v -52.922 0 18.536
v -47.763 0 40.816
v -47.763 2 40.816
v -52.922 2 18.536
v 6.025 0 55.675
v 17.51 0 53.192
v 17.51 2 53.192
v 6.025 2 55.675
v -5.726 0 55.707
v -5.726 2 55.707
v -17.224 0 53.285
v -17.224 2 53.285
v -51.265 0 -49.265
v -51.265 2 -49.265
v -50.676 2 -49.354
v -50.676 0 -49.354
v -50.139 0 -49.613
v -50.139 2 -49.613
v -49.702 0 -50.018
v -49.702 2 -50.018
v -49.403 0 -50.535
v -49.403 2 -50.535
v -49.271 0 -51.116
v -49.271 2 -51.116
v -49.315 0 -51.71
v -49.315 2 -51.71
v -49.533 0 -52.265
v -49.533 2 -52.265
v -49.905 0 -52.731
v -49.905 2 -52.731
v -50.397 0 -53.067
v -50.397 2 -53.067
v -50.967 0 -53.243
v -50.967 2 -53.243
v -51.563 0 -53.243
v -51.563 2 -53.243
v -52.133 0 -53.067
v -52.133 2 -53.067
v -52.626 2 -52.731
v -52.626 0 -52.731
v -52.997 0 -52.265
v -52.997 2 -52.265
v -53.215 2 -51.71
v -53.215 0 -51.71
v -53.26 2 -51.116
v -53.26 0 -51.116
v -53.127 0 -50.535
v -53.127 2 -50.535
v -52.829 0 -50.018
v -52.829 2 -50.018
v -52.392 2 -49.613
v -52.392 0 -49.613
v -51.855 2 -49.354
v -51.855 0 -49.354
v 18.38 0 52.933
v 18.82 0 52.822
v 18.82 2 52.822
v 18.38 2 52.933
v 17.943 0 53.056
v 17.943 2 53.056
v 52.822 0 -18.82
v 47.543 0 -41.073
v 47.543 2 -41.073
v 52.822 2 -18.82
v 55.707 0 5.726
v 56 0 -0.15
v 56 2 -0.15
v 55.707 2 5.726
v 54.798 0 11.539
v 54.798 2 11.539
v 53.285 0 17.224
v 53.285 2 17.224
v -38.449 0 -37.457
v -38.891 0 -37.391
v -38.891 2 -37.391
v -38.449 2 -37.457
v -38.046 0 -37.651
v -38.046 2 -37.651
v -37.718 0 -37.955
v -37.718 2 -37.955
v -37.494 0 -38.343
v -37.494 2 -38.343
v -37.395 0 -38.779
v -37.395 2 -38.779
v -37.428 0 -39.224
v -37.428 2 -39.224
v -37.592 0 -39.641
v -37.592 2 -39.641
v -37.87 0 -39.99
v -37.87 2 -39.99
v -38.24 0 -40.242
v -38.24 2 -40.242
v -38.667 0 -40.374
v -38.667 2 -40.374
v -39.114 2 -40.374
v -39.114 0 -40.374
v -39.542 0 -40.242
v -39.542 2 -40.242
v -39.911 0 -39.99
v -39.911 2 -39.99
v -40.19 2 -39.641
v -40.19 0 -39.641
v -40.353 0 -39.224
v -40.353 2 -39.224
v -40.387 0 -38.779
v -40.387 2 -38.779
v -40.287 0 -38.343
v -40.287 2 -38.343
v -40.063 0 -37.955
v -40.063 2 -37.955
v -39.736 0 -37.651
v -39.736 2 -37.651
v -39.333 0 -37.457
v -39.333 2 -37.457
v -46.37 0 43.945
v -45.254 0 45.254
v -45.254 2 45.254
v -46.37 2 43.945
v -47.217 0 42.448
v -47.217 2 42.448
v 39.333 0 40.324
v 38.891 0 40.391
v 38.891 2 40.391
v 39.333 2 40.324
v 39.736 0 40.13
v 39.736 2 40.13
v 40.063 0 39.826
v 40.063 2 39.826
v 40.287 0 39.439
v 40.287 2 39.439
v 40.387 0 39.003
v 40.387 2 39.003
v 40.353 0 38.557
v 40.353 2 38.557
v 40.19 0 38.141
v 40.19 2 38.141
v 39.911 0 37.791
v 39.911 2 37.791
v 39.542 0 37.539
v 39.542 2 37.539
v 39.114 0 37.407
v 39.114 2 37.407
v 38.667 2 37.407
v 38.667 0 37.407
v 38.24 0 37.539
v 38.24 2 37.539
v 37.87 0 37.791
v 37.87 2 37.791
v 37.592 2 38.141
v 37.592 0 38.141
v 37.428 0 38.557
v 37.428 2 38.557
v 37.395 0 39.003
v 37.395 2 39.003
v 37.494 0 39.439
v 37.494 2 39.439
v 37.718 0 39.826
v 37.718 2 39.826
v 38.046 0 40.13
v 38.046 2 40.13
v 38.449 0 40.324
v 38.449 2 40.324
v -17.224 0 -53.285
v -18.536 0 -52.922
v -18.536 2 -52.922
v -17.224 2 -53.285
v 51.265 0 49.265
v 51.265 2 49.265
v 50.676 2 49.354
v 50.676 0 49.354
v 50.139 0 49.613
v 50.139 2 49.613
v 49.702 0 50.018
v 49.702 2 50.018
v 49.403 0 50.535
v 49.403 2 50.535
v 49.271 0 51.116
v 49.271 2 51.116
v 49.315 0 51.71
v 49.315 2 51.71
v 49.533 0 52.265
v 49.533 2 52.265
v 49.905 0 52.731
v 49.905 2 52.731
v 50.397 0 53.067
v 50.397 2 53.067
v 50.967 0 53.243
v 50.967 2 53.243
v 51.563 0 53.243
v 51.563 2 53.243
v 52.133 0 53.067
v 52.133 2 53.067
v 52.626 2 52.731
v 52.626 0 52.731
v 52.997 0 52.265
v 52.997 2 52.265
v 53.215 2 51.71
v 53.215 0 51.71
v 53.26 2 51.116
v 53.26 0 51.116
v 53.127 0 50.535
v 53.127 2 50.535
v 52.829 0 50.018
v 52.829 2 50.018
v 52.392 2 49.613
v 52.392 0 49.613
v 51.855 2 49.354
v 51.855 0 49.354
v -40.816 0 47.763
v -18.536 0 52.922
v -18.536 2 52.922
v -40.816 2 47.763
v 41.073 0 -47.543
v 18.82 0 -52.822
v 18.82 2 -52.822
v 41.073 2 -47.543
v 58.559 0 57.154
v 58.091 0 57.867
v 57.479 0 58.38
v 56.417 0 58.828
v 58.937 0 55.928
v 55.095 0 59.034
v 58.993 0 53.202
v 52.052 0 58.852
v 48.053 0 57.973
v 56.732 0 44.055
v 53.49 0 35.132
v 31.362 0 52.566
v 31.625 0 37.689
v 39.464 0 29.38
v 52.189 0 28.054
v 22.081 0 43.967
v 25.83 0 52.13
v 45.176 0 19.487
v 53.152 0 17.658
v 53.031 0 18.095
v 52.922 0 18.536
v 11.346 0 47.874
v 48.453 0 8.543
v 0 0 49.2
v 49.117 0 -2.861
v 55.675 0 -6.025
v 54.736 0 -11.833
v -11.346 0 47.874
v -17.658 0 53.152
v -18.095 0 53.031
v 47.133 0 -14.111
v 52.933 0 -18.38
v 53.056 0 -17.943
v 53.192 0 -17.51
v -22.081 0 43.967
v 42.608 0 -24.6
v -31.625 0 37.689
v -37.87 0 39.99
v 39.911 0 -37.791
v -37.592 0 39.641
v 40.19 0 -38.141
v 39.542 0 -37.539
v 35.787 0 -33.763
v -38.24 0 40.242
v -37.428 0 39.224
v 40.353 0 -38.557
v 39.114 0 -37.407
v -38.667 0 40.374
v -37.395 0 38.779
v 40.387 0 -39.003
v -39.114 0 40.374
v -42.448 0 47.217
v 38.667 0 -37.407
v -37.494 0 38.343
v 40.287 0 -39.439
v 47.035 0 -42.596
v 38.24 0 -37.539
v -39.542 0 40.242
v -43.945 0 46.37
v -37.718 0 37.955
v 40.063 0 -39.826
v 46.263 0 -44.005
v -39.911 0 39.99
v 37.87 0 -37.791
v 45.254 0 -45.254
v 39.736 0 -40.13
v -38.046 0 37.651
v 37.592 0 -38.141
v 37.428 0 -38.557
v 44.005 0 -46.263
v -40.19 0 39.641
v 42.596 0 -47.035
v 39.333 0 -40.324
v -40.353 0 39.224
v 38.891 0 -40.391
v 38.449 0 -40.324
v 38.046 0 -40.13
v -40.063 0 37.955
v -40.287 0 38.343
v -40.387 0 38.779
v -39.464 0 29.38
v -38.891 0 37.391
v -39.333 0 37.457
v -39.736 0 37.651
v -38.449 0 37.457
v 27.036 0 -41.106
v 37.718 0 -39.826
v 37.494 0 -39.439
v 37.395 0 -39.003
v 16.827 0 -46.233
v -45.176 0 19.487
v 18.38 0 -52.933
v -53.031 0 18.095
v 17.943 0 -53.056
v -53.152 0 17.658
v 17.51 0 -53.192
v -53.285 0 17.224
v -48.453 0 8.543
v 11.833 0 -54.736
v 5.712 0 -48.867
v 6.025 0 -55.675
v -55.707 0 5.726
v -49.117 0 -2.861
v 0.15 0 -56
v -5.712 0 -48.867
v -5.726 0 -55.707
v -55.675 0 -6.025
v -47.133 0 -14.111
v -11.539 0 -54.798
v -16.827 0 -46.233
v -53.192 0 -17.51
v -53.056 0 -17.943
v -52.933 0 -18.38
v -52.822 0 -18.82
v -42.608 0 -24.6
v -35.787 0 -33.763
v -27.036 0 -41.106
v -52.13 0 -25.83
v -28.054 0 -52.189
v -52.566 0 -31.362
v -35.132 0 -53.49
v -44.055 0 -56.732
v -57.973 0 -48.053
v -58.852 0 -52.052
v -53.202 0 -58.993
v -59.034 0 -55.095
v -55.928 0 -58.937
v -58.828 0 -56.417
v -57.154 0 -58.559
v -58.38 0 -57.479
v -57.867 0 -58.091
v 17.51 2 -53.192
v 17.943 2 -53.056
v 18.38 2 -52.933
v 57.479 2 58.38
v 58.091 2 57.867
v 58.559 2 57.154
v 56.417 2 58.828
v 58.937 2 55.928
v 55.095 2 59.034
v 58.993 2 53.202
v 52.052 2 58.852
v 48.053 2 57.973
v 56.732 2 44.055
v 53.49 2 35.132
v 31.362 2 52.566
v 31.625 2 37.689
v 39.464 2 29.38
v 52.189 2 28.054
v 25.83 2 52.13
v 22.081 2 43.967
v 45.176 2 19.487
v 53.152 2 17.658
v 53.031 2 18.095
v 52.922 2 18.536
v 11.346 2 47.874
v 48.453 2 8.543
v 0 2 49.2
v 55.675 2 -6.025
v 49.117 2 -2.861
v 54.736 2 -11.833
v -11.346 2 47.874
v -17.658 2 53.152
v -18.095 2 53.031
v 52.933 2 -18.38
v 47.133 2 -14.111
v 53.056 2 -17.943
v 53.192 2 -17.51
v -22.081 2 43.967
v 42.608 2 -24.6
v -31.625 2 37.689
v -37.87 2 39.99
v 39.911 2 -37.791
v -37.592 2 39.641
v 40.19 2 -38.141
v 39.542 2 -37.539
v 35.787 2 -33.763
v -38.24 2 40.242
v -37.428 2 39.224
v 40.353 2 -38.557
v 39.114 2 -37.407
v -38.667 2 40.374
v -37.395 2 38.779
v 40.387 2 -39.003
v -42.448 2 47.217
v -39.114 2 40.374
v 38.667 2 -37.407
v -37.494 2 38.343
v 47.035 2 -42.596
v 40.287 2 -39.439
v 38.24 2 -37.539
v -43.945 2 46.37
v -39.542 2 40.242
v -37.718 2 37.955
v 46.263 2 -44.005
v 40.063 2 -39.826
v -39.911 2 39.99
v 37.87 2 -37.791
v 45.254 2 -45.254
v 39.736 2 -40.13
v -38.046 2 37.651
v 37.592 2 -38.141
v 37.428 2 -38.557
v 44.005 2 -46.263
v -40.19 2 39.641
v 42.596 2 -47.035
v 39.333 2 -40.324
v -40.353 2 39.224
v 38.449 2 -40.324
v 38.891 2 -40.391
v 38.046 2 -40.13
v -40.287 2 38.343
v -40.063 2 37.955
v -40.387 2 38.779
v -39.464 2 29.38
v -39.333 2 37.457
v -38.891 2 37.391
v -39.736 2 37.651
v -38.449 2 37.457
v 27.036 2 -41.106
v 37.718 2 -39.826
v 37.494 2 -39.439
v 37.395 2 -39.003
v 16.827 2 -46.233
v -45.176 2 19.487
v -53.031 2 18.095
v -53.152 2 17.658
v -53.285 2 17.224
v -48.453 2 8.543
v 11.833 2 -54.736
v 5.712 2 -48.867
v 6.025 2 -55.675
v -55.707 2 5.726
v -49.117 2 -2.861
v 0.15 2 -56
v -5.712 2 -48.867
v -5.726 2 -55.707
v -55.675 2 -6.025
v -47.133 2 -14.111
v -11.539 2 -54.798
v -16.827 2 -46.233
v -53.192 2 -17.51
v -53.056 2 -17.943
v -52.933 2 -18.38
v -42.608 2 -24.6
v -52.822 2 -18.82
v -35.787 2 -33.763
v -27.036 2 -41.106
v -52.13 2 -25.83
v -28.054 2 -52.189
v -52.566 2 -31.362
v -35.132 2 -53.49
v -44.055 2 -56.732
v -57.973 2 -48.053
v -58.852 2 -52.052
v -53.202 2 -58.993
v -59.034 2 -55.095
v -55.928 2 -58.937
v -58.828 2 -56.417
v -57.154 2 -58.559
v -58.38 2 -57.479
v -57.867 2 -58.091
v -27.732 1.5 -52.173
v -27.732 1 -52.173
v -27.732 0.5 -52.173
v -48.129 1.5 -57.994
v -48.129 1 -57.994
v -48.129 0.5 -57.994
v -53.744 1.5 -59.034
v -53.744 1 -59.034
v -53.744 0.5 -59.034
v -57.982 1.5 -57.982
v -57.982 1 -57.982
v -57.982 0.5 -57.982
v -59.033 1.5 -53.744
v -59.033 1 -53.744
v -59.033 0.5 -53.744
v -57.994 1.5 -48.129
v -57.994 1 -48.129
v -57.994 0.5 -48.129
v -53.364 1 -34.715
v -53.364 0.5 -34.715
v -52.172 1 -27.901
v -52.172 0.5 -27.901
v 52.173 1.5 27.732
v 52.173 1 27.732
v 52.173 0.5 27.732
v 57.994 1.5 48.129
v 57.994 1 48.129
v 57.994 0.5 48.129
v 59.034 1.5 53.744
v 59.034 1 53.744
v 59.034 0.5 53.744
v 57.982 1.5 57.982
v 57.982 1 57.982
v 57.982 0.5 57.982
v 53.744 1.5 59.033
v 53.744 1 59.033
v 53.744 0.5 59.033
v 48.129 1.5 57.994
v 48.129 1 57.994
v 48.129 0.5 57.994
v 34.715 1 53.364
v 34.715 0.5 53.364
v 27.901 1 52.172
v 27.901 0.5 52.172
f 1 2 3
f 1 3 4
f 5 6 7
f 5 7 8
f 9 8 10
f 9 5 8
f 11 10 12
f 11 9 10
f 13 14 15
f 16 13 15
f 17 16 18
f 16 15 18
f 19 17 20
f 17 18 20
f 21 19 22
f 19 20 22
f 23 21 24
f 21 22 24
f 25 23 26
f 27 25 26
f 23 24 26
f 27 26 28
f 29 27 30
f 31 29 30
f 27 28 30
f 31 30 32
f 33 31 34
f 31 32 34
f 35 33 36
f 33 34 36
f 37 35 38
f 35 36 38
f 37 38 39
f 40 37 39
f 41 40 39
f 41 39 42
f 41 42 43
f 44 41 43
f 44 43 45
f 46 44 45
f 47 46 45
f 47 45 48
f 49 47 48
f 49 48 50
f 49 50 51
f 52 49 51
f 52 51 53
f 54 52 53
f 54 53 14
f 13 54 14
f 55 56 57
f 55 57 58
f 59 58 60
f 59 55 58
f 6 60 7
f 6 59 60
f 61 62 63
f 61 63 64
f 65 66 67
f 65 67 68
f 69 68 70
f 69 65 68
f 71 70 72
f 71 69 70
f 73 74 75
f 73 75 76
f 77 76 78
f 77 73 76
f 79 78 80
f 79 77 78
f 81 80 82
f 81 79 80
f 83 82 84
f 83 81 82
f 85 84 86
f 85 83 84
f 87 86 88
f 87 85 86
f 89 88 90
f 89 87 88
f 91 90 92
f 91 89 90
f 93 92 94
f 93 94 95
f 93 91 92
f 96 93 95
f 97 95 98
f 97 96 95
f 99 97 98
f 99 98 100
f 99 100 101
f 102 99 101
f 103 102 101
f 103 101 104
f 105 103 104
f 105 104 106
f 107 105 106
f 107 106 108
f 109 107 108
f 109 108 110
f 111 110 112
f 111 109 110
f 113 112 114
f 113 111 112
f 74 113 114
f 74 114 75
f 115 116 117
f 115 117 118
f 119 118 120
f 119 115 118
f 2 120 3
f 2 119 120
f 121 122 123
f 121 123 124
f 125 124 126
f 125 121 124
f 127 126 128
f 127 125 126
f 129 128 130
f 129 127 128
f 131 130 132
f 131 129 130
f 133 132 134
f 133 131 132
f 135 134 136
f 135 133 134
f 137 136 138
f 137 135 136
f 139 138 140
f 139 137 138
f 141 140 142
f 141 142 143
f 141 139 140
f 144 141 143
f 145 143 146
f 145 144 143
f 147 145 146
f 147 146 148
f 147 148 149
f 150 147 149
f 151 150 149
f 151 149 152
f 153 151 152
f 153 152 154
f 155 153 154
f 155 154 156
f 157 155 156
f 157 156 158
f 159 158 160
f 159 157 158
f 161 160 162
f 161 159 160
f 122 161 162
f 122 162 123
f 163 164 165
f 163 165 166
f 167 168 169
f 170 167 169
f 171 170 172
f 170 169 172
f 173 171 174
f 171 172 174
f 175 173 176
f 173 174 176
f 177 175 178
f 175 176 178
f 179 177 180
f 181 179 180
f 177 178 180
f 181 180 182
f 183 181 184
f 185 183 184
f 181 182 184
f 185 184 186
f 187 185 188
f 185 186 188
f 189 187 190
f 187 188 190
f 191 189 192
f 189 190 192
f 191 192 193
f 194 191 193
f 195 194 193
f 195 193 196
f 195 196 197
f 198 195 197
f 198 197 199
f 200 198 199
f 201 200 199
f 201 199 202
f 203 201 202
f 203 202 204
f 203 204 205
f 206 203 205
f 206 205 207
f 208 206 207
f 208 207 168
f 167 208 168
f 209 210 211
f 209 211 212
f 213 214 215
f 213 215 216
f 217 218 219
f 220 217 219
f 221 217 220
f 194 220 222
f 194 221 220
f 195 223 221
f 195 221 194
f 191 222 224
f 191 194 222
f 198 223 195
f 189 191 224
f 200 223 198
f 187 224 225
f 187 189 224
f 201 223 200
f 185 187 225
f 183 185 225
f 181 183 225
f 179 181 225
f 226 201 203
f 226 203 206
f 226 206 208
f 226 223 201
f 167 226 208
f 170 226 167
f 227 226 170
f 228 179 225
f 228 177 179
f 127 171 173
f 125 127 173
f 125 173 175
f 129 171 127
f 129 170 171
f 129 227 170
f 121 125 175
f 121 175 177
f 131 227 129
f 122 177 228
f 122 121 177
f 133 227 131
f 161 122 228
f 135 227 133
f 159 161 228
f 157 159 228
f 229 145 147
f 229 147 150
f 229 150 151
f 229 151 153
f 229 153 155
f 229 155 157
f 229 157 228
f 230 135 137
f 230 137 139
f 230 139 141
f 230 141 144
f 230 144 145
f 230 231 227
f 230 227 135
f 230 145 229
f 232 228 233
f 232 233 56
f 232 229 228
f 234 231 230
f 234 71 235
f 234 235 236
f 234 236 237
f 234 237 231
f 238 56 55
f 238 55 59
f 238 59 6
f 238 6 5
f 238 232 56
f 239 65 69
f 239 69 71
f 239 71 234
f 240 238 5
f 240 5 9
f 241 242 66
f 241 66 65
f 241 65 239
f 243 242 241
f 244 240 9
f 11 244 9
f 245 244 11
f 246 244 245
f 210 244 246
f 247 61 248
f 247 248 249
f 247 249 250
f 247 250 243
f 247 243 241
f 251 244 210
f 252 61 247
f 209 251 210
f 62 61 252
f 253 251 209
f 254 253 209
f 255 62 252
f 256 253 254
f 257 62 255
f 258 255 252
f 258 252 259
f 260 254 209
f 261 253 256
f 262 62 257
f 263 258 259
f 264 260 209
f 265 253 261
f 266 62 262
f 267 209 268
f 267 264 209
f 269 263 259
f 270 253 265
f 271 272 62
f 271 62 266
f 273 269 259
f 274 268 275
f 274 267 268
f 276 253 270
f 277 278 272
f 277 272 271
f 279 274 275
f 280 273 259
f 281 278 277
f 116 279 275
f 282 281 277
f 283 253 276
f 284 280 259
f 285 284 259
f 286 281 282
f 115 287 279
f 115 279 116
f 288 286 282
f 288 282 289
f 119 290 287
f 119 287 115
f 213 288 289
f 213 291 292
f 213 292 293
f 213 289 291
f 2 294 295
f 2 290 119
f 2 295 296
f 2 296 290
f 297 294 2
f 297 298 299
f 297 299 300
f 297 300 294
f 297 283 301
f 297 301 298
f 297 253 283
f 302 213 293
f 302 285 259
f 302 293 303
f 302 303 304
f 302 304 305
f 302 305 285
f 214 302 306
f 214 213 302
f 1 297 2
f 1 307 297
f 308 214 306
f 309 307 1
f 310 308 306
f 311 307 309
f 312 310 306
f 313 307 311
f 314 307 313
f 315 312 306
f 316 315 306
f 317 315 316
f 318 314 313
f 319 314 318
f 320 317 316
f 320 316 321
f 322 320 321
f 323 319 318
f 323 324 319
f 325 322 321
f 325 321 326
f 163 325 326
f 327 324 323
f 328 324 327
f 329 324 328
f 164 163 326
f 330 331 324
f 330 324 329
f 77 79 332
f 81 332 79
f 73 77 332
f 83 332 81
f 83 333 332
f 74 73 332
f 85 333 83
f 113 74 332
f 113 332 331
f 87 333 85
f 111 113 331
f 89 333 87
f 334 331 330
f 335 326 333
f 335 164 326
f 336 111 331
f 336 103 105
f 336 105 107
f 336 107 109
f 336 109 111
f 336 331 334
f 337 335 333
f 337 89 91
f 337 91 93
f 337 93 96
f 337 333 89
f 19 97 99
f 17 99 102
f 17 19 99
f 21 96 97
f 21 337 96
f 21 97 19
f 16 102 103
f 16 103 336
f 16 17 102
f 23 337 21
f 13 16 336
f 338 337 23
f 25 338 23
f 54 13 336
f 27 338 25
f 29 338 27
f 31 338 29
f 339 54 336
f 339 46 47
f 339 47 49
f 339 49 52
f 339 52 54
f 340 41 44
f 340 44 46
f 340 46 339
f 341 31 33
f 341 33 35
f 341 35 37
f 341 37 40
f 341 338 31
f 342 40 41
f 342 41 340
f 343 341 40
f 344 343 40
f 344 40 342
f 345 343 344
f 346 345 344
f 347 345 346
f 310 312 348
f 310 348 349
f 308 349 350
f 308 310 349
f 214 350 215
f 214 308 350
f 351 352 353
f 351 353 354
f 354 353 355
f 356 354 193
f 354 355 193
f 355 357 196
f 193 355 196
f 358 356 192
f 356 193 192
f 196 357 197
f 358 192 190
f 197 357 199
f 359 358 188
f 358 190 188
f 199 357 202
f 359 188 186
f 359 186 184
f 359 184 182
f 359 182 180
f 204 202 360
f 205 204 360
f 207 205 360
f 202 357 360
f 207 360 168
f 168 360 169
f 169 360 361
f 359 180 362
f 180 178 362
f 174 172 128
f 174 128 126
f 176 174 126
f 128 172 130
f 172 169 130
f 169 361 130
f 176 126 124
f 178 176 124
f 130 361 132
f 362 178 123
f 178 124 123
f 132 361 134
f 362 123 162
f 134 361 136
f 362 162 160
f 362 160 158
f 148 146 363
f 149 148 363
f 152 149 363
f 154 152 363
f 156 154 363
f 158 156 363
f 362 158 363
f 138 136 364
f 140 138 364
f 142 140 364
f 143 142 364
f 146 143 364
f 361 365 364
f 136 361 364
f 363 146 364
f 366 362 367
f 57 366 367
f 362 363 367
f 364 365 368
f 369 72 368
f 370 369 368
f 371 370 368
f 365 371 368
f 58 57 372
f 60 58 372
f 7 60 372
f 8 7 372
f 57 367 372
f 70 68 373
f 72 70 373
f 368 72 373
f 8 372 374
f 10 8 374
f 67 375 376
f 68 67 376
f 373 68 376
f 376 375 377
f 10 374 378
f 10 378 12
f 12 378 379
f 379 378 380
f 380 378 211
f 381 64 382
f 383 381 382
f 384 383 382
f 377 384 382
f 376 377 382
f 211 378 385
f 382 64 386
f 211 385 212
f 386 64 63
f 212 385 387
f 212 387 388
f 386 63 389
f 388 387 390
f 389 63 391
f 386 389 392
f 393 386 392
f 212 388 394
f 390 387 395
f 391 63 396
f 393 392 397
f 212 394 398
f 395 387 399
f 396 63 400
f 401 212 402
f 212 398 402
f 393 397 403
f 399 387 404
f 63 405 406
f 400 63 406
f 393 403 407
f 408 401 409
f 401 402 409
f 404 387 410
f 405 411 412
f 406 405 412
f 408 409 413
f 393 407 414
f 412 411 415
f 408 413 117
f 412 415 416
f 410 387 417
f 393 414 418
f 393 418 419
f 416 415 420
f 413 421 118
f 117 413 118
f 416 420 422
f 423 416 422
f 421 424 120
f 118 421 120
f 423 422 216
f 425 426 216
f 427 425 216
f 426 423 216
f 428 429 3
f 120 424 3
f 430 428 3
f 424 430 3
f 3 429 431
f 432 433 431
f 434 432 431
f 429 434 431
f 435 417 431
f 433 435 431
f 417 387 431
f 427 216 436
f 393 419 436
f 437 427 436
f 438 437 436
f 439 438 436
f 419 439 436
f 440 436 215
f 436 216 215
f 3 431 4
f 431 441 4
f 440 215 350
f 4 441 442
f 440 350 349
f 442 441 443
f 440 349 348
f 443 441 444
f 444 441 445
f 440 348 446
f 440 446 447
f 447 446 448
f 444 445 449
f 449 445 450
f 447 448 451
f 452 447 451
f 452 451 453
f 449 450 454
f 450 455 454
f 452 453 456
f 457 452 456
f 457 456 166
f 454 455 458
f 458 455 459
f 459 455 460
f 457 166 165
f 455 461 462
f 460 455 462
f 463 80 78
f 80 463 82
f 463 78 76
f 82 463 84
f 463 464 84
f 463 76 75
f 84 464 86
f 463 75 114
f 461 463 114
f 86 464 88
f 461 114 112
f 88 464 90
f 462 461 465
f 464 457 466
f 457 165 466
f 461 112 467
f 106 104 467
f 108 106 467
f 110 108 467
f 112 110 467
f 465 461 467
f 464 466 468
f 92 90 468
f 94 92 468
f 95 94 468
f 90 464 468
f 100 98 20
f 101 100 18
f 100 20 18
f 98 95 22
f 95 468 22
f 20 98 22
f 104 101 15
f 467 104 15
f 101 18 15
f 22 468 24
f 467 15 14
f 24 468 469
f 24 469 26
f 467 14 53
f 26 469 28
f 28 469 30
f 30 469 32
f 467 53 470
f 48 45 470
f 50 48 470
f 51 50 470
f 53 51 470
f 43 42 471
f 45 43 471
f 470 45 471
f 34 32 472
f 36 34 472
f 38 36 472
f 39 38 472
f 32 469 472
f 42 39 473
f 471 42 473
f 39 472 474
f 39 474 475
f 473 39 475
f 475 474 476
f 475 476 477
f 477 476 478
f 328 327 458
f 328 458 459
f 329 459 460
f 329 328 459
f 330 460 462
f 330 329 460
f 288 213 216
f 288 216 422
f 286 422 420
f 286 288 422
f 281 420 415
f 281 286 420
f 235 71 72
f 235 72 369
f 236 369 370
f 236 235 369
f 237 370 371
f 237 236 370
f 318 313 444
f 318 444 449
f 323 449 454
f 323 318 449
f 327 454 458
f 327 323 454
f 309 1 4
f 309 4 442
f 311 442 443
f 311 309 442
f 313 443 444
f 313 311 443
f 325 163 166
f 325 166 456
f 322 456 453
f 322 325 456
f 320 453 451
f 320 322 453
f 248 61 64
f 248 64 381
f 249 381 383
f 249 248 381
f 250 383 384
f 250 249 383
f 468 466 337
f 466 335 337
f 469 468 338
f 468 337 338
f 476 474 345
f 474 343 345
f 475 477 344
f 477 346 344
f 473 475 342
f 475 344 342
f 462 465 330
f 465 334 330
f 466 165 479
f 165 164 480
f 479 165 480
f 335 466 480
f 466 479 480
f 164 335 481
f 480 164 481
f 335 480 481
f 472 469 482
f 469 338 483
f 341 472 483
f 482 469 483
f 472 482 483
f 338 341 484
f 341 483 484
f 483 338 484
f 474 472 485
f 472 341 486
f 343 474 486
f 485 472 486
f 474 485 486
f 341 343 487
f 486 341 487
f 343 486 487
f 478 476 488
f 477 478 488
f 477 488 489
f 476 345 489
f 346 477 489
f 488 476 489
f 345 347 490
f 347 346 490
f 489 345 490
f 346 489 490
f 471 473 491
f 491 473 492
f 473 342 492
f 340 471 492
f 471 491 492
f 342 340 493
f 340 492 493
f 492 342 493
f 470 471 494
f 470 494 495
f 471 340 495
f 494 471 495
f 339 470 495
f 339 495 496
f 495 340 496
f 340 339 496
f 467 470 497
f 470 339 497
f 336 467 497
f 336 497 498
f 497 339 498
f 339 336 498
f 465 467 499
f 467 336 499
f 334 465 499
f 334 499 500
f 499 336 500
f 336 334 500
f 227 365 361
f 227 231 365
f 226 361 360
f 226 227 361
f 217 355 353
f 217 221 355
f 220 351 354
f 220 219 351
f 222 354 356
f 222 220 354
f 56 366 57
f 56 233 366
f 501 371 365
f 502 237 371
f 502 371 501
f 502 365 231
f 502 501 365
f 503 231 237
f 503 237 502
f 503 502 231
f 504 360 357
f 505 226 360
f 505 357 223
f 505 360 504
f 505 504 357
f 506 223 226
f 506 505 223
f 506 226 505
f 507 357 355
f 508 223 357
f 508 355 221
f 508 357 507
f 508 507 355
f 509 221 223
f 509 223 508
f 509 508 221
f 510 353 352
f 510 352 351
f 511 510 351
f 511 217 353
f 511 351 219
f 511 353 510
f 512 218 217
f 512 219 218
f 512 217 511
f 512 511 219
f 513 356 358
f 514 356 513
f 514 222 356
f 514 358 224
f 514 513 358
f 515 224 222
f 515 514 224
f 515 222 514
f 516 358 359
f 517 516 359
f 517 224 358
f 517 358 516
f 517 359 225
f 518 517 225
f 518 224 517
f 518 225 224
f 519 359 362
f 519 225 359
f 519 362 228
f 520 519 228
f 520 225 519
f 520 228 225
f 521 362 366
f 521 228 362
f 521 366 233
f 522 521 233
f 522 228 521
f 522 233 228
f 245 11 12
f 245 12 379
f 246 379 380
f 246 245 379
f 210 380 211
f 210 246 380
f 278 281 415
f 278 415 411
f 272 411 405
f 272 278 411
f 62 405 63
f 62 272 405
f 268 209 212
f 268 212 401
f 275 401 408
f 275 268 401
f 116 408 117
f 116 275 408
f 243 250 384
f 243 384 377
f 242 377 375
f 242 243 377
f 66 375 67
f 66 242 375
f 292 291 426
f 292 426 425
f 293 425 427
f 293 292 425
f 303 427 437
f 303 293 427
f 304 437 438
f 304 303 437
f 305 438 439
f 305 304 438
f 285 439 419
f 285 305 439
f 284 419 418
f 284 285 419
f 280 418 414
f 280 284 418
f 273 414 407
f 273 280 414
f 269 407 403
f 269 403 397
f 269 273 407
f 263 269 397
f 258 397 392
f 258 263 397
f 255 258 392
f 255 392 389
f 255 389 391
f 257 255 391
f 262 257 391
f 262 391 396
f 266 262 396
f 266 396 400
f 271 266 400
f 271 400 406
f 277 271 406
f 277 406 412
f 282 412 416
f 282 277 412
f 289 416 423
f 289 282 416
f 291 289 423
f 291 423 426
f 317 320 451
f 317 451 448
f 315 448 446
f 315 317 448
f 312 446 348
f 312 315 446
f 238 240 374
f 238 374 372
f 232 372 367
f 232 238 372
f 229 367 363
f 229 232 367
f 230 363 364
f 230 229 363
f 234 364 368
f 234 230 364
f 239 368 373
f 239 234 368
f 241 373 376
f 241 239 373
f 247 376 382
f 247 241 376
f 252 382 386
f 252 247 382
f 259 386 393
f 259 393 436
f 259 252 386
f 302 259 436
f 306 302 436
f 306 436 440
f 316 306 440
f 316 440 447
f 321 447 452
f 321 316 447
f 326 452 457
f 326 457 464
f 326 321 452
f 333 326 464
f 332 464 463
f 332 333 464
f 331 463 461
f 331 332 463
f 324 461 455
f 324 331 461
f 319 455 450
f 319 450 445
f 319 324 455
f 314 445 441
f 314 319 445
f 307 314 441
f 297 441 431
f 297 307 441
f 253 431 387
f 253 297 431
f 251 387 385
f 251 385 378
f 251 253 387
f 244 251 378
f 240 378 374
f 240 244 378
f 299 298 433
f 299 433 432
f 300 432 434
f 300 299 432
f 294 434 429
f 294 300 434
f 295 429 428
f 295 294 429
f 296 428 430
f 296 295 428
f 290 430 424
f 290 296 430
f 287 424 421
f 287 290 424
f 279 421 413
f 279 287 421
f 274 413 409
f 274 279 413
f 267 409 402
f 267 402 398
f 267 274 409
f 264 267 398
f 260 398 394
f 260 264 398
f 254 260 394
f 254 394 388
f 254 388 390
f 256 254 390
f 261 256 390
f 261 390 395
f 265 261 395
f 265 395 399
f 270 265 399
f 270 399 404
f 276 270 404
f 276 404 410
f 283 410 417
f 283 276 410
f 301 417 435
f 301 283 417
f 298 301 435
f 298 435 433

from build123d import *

# Parameters (mm, degrees)
SKETCH1_R           = 1.5
SKETCH1_R_2         = 49.2
BOSS_EXTRUDE1_DEPTH = 2
SKETCH2_R           = 2
CUT_EXTRUDE1_DEPTH  = 84.538877218


with BuildPart() as part:
    # Sketch1 → Boss-Extrude1 (new body)
    with BuildSketch(Plane(origin=(0, 0, 0), x_dir=(1, 0, 0), z_dir=(0, 1, 0))):
        with BuildLine():
            Line((18.82031265, 52.821731984), (41.072517471, 47.543215273))
            ThreePointArc((41.072517471, 47.543215273), (43.317509083, 46.680398122), (45.253835365, 45.253835365))
            ThreePointArc((45.253835365, 45.253835365), (46.680398122, 43.317509083), (47.543215273, 41.072517471))
            Line((47.543215273, 41.072517471), (52.821731984, 18.82031265))
            ThreePointArc((52.821731984, 18.82031265), (52.992929389, 18.161367335), (53.192004456, 17.510301595))
            ThreePointArc((53.192004456, 17.510301595), (55.281581077, 8.941297091), (55.999797799, 0.150487493))
            ThreePointArc((55.999797799, 0.150487493), (55.328837954, -8.644055219), (53.285345919, -17.224166462))
            ThreePointArc((53.285345919, -17.224166462), (53.089772901, -17.876292734), (52.922119493, -18.536148639))
            add(Edge.make_bspline(
                [(52.922119493, -18.536148639), (50.275210127, -33.089832281), (56.508752557, -38.252381664), (60.591514669, -60.591343739), (38.37255444, -56.530788224), (33.171934015, -50.362758483), (18.82031265, -52.821731984)],
                knots=[0, 0, 0, 0, 0.378239646, 0.501703935, 0.625168225, 1, 1, 1, 1], degree=3))
            ThreePointArc((18.82031265, -52.821731984), (18.161367335, -52.992929389), (17.510301595, -53.192004456))
            ThreePointArc((17.510301595, -53.192004456), (0.150487493, -55.999797799), (-17.224166462, -53.285345919))
            ThreePointArc((-17.224166462, -53.285345919), (-17.876292734, -53.089772901), (-18.536148639, -52.922119493))
            Line((-18.536148639, -52.922119493), (-40.816401641, -47.763274249))
            ThreePointArc((-40.816401641, -47.763274249), (-43.21650894, -46.829307007), (-45.253835365, -45.253835365))
            ThreePointArc((-45.253835365, -45.253835365), (-46.829307007, -43.21650894), (-47.763274249, -40.816401641))
            Line((-47.763274249, -40.816401641), (-52.922119493, -18.536148639))
            ThreePointArc((-52.922119493, -18.536148639), (-53.089772901, -17.876292734), (-53.285345919, -17.224166462))
            ThreePointArc((-53.285345919, -17.224166462), (-55.999797799, 0.150487493), (-53.192004456, 17.510301595))
            ThreePointArc((-53.192004456, 17.510301595), (-52.992929389, 18.161367335), (-52.821731984, 18.82031265))
            add(Edge.make_bspline(
                [(-18.536148639, 52.922119493), (-33.089832281, 50.275210127), (-38.252381664, 56.508752557), (-60.591343739, 60.591514669), (-56.530788224, 38.37255444), (-50.362758483, 33.171934015), (-52.821731984, 18.82031265)],
                knots=[0, 0, 0, 0, 0.378239646, 0.501703935, 0.625168225, 1, 1, 1, 1], degree=3))
            Line((-18.536148639, 52.922119493), (-17.224166462, 53.285345919))
            ThreePointArc((-17.224166462, 53.285345919), (-8.644055219, 55.328837954), (0.150487493, 55.999797799))
            ThreePointArc((0.150487493, 55.999797799), (8.941297091, 55.281581077), (17.510301595, 53.192004456))
            ThreePointArc((17.510301595, 53.192004456), (18.161367335, 52.992929389), (18.82031265, 52.821731984))
        make_face()
        with Locations(Location((-38.8907, 38.8907, 0), (0, 0, 270))):
            Circle(SKETCH1_R, mode=Mode.SUBTRACT)
        with Locations(Location((38.8907, 38.8907, 0), (0, 0, 90))):
            Circle(SKETCH1_R, mode=Mode.SUBTRACT)
        with Locations(Location((38.8907, -38.8907, 0), (0, 0, 270))):
            Circle(SKETCH1_R, mode=Mode.SUBTRACT)
        with Locations(Location((-38.8907, -38.8907, 0), (0, 0, 90))):
            Circle(SKETCH1_R, mode=Mode.SUBTRACT)
        with Locations(Location((0, 0, 0), (0, 0, 270))):
            Circle(SKETCH1_R_2, mode=Mode.SUBTRACT)
    extrude(amount=BOSS_EXTRUDE1_DEPTH)

    # Sketch2 → Cut-Extrude1 (cut, through all)
    with BuildSketch(Plane(origin=(0, 2, 0), x_dir=(1, 0, 0), z_dir=(0, 1, 0))):
        with Locations(Location((-51.265241636, 51.265241636, 0), (0, 0, 270))):
            Circle(SKETCH2_R)
        with Locations(Location((51.265241636, -51.265241636, 0), (0, 0, 90))):
            Circle(SKETCH2_R)
    extrude(amount=-CUT_EXTRUDE1_DEPTH, mode=Mode.SUBTRACT)


solid = part.part
